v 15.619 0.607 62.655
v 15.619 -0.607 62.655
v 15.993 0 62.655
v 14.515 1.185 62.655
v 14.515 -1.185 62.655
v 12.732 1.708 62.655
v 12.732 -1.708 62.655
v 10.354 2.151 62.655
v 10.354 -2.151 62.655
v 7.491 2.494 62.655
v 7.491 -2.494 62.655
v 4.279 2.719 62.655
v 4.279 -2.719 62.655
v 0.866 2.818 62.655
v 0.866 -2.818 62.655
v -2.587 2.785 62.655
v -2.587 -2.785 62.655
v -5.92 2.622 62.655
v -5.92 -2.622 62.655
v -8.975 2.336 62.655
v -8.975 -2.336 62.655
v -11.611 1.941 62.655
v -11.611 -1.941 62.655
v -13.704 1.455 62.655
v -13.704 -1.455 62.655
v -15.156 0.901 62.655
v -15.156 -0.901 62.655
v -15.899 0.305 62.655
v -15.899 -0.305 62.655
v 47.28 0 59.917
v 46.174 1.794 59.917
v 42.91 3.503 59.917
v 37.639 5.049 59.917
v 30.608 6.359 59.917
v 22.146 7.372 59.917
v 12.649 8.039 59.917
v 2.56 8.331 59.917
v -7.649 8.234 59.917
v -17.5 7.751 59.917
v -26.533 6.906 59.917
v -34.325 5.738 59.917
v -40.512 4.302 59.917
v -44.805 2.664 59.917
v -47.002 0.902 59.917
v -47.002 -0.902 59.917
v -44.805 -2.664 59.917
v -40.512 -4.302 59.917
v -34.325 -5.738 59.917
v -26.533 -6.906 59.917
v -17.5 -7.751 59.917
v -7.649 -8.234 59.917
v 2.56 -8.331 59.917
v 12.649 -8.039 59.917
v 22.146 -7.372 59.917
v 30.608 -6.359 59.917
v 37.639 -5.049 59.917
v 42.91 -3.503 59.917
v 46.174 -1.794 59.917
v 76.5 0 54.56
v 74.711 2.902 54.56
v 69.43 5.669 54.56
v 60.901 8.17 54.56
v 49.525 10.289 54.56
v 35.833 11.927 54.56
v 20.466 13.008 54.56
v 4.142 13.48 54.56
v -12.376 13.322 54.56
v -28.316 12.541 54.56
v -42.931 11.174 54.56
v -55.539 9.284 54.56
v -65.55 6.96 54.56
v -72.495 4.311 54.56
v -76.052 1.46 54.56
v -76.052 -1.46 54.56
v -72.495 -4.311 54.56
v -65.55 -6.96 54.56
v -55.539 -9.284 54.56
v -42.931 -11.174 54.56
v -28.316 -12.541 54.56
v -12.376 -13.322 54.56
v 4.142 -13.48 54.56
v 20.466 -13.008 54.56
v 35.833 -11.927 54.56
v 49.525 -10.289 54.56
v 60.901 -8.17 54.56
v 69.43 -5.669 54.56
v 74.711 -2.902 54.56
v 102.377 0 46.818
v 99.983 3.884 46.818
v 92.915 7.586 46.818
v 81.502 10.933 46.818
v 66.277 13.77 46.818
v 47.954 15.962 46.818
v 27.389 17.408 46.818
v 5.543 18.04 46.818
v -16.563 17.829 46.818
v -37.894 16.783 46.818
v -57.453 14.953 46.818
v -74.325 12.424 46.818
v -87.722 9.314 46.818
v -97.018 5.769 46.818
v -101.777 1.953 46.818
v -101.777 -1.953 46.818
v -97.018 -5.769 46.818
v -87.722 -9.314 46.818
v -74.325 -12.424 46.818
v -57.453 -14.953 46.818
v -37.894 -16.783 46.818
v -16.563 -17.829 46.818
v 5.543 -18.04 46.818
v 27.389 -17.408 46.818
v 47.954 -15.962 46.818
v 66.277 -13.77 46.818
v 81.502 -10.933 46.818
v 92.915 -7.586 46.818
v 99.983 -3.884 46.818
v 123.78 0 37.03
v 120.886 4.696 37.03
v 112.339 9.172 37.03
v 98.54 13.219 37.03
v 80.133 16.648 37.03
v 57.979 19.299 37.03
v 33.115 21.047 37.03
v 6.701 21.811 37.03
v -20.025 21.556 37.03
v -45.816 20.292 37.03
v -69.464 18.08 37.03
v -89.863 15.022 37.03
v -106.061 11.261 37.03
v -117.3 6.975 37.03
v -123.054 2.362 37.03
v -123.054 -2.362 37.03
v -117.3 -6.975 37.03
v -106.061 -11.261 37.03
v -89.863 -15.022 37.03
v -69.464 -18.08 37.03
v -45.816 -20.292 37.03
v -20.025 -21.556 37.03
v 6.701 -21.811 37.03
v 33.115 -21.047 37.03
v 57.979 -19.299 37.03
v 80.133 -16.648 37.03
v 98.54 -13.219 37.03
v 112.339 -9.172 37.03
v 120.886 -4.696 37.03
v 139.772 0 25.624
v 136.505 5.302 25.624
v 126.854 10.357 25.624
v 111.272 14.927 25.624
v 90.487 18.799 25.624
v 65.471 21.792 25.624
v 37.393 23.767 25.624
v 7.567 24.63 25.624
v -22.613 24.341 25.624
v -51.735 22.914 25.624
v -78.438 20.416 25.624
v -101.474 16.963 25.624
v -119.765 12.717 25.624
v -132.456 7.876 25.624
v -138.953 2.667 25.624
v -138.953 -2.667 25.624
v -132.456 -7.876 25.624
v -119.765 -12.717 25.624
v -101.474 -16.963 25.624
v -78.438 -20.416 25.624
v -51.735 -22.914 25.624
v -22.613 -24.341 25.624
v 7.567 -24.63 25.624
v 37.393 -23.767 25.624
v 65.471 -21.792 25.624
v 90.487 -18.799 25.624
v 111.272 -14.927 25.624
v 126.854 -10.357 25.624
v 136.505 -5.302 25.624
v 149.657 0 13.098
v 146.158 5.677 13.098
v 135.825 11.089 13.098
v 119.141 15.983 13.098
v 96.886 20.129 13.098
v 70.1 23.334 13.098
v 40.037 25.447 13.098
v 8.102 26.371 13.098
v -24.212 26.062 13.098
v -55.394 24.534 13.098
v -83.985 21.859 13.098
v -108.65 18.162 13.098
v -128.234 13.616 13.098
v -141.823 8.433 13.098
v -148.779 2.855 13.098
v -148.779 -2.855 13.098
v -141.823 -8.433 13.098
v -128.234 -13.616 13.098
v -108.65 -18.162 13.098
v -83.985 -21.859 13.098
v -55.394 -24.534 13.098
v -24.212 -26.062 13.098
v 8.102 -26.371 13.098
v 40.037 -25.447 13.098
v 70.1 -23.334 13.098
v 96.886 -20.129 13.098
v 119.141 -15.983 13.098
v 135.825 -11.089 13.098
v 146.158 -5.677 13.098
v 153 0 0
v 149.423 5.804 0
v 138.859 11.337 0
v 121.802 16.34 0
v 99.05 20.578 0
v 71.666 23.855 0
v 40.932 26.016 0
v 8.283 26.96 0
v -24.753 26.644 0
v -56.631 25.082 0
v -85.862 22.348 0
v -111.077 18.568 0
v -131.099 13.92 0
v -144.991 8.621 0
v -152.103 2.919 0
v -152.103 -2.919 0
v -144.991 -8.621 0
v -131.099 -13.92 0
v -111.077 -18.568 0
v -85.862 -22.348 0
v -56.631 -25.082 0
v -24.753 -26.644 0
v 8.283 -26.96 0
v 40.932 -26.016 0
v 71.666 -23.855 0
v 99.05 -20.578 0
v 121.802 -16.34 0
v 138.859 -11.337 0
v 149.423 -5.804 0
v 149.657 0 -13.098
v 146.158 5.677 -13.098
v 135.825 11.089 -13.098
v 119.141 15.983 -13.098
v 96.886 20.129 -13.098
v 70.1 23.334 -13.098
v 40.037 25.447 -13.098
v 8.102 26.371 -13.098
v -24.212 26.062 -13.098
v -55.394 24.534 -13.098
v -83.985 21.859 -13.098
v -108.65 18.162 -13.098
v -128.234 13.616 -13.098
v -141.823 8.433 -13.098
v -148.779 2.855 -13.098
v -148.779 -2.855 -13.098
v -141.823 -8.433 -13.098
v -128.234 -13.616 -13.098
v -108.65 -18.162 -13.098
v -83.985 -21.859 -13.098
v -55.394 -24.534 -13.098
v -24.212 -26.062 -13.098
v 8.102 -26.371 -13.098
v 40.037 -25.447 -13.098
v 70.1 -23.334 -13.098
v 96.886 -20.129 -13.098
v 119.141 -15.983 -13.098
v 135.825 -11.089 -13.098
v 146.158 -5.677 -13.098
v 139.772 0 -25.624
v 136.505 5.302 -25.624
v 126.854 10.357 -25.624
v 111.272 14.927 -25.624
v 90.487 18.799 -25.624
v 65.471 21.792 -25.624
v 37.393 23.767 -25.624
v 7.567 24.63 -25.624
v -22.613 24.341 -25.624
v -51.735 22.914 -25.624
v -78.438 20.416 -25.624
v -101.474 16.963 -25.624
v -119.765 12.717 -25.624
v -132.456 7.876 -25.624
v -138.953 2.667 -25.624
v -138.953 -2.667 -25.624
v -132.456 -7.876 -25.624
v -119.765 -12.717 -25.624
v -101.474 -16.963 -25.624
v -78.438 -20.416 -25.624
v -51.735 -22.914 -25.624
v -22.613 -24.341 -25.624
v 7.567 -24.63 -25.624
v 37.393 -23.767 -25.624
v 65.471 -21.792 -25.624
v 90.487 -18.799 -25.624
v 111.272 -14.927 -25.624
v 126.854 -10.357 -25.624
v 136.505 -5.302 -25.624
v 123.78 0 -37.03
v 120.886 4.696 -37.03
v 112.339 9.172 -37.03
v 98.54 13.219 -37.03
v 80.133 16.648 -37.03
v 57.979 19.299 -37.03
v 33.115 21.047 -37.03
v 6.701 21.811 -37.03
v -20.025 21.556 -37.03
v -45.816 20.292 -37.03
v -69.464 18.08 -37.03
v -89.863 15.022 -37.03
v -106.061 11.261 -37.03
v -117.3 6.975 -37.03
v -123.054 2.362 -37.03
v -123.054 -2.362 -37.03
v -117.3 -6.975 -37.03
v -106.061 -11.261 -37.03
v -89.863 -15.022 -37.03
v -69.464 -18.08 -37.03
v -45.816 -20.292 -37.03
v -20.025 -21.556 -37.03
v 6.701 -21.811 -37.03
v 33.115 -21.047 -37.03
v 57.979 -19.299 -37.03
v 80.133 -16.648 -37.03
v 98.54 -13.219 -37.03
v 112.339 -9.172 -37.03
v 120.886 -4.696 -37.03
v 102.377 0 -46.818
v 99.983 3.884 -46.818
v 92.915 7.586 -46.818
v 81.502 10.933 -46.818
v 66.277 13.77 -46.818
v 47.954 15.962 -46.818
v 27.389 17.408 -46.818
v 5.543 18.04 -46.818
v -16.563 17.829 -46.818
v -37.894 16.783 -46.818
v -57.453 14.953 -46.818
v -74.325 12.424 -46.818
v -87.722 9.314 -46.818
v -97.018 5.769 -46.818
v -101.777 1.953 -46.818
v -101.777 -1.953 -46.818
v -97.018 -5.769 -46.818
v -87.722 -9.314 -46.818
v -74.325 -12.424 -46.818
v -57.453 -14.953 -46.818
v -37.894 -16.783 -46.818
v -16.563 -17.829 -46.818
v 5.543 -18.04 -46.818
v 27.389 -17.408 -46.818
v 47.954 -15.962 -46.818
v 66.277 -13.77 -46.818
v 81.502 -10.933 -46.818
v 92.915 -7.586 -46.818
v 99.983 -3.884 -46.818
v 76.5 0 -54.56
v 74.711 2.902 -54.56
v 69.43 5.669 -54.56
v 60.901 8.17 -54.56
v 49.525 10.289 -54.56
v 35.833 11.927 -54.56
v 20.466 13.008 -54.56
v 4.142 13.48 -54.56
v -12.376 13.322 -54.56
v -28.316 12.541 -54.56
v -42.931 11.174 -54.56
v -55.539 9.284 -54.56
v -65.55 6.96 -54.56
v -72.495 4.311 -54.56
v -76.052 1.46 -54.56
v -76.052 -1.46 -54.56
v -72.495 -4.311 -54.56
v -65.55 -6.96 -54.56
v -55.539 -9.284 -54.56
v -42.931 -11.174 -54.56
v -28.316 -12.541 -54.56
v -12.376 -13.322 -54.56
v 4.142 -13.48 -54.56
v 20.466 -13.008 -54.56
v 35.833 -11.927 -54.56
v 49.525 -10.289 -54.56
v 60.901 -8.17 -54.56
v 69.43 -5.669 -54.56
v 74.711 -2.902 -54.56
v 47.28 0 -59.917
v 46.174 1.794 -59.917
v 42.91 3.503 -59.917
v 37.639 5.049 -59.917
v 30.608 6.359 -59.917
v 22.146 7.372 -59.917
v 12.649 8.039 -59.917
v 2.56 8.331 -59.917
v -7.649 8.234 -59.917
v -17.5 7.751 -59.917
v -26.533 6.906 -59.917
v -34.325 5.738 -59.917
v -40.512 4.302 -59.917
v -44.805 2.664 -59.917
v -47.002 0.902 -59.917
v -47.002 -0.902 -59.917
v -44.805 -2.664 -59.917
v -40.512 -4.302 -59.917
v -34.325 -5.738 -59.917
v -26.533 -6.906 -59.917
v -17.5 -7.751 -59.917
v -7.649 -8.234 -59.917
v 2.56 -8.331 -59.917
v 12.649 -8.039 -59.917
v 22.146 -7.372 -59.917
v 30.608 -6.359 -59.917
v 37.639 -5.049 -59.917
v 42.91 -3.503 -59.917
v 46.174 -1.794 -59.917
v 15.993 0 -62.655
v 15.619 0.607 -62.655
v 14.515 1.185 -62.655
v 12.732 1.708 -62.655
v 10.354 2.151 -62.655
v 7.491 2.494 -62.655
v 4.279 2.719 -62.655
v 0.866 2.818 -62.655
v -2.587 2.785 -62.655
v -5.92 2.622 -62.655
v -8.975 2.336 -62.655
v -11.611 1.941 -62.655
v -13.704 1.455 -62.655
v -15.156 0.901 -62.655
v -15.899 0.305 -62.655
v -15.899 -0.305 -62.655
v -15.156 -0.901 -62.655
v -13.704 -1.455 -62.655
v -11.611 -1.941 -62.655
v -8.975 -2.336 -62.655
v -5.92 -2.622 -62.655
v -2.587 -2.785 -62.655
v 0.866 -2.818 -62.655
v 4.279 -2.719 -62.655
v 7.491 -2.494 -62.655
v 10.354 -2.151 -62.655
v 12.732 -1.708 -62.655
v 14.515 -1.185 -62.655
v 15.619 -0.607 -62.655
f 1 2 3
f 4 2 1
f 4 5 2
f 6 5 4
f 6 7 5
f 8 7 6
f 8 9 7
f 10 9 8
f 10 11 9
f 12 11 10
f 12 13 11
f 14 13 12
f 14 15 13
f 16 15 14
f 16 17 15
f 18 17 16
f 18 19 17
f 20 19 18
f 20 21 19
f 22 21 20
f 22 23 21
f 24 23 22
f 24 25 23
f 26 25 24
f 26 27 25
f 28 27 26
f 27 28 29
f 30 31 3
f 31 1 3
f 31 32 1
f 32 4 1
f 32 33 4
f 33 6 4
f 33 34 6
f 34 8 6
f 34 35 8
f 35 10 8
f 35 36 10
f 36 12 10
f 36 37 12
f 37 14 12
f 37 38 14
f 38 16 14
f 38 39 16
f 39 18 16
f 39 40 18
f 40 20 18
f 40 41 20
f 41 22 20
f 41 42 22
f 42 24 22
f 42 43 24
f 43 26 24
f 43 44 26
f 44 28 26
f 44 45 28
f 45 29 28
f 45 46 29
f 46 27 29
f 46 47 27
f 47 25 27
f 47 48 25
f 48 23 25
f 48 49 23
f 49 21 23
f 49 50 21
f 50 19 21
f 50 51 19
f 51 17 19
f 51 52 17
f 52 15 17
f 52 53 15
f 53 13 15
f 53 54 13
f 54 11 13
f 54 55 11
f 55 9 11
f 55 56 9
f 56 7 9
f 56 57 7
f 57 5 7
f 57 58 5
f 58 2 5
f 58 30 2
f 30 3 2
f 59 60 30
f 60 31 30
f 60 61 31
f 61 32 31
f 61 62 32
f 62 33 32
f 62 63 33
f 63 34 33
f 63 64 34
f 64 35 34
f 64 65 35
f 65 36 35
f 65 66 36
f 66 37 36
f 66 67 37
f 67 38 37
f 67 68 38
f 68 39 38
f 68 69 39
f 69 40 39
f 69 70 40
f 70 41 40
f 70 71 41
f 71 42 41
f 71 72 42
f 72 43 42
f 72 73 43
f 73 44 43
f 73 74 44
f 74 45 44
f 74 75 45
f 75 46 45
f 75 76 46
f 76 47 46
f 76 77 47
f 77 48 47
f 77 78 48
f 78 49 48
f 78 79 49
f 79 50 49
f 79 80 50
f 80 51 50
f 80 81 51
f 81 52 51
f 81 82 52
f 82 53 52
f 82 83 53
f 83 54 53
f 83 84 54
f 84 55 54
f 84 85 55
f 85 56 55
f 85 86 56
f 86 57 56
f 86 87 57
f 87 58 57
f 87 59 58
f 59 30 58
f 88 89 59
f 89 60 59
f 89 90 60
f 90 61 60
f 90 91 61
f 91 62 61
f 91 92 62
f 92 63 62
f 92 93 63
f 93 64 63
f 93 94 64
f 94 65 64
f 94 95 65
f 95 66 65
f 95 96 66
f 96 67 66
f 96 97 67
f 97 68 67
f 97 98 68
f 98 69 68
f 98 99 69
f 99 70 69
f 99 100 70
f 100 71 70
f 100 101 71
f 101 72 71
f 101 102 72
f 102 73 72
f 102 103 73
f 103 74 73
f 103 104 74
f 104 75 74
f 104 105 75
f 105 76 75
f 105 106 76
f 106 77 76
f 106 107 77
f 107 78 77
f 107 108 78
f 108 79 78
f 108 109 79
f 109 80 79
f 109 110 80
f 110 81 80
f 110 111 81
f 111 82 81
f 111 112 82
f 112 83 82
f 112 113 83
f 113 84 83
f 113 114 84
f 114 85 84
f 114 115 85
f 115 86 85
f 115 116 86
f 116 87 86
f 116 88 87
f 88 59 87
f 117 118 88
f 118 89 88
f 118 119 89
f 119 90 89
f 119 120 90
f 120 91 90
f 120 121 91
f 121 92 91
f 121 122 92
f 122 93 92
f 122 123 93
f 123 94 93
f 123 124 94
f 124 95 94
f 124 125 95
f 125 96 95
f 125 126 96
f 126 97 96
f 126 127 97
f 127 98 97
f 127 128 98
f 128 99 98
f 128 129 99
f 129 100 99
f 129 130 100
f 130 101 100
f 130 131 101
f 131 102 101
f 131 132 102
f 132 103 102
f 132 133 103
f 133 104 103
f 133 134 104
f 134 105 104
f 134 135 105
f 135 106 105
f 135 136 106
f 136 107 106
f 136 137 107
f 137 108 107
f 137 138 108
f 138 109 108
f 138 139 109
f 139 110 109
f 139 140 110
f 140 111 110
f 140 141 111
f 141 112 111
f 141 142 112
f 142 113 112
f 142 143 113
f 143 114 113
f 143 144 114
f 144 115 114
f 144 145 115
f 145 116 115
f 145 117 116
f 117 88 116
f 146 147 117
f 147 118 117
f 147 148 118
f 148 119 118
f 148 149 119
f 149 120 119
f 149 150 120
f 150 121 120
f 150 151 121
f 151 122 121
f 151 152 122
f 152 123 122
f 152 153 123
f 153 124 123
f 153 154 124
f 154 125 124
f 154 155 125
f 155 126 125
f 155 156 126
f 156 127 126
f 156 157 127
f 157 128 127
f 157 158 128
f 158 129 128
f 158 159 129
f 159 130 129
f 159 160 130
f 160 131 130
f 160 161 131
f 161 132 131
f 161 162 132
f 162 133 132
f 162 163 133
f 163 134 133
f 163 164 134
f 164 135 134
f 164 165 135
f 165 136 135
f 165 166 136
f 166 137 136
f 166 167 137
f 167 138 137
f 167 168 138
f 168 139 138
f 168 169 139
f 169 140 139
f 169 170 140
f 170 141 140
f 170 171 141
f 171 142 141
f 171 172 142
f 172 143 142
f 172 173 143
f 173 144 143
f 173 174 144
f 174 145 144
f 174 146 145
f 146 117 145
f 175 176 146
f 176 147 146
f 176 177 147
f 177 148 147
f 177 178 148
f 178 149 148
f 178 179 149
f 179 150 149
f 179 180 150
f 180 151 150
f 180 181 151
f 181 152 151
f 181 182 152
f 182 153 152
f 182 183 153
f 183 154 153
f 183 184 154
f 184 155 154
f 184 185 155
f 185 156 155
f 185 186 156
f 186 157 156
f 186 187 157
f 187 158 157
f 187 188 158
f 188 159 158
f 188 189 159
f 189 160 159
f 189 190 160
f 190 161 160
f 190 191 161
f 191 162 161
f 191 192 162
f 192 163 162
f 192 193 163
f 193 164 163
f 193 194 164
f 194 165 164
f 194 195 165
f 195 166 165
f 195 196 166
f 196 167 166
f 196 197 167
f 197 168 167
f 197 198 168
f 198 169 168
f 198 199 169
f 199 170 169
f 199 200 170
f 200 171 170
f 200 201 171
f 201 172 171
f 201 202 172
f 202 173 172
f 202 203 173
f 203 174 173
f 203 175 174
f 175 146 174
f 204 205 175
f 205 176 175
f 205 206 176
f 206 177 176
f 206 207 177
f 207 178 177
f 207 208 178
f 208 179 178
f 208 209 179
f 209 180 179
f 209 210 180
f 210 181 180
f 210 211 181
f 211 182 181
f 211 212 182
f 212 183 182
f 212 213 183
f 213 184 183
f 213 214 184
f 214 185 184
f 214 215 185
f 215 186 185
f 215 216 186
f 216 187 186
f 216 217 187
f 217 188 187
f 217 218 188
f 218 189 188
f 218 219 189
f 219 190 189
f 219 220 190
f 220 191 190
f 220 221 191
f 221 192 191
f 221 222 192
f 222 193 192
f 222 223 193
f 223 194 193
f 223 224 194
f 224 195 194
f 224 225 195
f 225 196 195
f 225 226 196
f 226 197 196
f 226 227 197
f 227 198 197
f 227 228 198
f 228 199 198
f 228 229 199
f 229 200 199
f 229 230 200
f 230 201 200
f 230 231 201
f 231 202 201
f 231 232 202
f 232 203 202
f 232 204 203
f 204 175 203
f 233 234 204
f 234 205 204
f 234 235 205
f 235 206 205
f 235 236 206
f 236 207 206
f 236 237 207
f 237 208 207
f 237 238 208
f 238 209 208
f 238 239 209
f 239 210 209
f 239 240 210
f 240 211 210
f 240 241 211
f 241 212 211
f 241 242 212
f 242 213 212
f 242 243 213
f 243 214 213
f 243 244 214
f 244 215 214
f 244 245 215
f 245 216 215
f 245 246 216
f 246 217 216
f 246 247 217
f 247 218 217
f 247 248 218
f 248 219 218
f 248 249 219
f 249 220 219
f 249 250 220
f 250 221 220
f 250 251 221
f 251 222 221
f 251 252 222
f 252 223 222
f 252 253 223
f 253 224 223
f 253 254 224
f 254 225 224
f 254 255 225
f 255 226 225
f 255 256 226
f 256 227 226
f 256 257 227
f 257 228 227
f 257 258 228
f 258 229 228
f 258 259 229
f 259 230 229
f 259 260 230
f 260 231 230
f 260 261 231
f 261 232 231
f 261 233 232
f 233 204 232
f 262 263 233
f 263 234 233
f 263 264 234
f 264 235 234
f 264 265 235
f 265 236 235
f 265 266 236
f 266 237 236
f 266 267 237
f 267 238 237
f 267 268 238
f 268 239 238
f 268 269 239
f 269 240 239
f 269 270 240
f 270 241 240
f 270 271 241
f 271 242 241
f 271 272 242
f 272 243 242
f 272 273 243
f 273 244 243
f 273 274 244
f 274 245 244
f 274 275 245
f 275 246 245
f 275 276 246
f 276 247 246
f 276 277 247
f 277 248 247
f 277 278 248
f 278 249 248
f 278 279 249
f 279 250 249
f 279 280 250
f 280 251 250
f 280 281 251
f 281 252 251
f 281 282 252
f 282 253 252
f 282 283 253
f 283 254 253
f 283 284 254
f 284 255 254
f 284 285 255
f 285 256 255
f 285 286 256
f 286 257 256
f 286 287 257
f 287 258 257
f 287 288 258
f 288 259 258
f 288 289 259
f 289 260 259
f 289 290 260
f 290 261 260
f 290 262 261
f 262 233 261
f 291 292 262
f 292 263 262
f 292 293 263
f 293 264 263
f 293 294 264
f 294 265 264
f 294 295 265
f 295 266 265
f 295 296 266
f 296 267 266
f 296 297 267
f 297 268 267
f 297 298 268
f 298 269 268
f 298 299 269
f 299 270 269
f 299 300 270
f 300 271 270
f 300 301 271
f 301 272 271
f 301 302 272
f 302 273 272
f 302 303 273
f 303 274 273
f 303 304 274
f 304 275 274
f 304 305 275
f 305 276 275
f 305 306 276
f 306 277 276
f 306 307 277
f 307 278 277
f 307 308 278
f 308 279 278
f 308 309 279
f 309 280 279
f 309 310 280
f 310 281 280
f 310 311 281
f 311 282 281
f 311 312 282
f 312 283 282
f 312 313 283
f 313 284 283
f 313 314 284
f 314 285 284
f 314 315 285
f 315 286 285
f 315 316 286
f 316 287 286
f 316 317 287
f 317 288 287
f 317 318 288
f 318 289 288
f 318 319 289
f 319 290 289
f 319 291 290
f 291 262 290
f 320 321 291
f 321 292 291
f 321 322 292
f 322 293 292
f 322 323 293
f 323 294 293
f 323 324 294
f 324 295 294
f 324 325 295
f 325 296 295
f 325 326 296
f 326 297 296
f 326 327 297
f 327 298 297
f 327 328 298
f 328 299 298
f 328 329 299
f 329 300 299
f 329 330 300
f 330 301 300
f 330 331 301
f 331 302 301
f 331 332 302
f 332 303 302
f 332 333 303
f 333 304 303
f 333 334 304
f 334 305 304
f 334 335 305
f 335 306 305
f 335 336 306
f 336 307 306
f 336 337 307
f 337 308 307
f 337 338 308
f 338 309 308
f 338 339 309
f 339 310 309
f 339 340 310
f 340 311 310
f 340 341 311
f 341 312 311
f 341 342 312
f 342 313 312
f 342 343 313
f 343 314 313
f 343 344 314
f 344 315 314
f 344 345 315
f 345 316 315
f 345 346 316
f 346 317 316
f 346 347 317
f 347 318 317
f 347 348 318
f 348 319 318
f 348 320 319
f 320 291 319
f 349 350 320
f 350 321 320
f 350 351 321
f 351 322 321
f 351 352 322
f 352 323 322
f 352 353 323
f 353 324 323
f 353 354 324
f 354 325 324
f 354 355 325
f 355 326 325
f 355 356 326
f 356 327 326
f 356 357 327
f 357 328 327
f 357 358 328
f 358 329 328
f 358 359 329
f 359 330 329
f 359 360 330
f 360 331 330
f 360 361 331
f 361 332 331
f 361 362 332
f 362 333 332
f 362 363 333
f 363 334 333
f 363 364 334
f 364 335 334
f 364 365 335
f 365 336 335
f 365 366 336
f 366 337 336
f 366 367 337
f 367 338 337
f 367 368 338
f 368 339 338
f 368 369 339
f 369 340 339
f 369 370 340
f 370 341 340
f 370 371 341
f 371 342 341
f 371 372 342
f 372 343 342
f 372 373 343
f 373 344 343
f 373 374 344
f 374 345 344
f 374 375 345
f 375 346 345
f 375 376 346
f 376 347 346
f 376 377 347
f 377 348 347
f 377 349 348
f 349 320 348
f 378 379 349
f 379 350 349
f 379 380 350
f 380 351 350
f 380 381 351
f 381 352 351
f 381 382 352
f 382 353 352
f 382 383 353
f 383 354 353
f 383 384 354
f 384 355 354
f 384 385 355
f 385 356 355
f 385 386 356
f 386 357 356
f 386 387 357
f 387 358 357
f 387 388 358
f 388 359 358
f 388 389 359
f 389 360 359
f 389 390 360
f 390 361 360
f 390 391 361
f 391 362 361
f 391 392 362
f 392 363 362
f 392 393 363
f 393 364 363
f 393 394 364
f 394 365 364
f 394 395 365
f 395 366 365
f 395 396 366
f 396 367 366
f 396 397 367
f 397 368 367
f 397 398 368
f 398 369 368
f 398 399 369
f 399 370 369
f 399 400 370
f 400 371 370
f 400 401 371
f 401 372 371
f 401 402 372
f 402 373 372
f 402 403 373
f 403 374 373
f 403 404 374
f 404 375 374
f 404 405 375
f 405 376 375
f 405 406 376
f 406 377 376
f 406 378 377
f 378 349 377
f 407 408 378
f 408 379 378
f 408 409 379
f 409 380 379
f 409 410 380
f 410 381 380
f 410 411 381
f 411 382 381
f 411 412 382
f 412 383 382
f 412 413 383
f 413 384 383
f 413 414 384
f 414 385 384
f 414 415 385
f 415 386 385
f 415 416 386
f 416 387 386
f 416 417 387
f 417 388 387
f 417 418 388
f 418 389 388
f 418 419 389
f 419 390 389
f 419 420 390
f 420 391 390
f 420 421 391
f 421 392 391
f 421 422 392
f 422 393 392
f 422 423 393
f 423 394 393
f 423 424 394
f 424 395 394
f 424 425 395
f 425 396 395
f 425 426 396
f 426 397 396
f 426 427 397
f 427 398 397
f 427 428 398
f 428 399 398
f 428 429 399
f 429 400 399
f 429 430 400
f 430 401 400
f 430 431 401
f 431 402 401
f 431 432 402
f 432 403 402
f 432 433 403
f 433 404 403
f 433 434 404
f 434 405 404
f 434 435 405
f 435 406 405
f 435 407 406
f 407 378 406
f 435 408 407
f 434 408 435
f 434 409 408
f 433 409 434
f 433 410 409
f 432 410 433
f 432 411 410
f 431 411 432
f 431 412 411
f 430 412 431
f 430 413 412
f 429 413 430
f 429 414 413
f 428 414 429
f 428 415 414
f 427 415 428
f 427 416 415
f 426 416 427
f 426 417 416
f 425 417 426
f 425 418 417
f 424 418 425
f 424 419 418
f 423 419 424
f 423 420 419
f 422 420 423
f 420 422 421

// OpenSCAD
// Generated by SolidPython 1.0.1 on 2020-07-29 00:46:52


scale(v = [17, 3, 7]) {
	sphere(r = 9);
}
/***********************************************
*********      SolidPython code:      **********
************************************************
 
# import packages: SolidPython
from solid import *
from solid.utils import *
from itertools import chain, combinations, permutations


class Resize:

    def __init__(self, scad_file):
        self.scad_file = scad_file
        #self.scad_file = import_scad(scad_file)
        # cone/cylinder param:
        self.r1 = 0
        self.r2 = 0
        self.h = 0
        # rectangular prism param:
        self.w = 0
        self.l = 0
        # ellipse param:
        self.r = 0

    # import OpenScad code (file name corresponds to shape)


    # classify shape + parameters
    def assign(self, param1, param2, param3):
        if self.scad_file == 'cone.scad':
            self.r1 = param1
            self.r2 = param2
            self.h = param3
        elif self.scad_file == 'cylinder.scad':
            self.r1 = param1
            self.r2 = param2
            self.h = param3
        elif self.scad_file == 'rectangularPrism.scad':
            self.h = param1
            self.l = param2
            self.w = param3
        else:
            self.r = param1
            self.h = param2

    # resize parameters
    def iterate(self):
        x = range(3, 20, 2)
        i = 1
        if self.scad_file == 'cone.scad':
            tempList = list(permutations(x, 2))
            for temp in tempList:
                param1 = temp[0]
                param2 = temp[1]
                filepath = 'produced_scad_files/' + 'cone' + str(param1) + '_' + str(param2) + '_' + '.scad'
                scad_render_to_file(cylinder(h=param1, r1=param2, r2=0), filepath)

        elif self.scad_file == 'cylinder.scad':
            tempList = list(permutations(x, 3))
            for temp in tempList:
                param1 = temp[0]
                param2 = temp[1]
                filepath = 'produced_scad_files/' + 'cylinder' + str(param1) + '_' + str(param2) + '_' + '.scad'
                scad_render_to_file(cylinder(h=param1, r1=param2, r2=param2), filepath)

        elif self.scad_file == 'rectangularPrism.scad':
            tempList = list(permutations(x, 3))
            for temp in tempList:
                param1 = temp[0]
                param2 = temp[1]
                param3 = temp[2]
                filepath = 'produced_scad_files/' + 'rectangularPrism' + str(param1) + '_' + str(param2) + '_' + str(
                    param3) + '.scad'
                scad_render_to_file(cube(size=(param1, param2, param3)), filepath)

        elif self.scad_file == 'ellipse.scad':
            tempList = list(permutations(x, 4))
            for temp in tempList:
                param1 = temp[0]
                param2 = temp[1]
                param3 = temp[2]
                param4 = temp[3]
                filepath = 'produced_scad_files/' + 'ellipse' + str(param1) + '_' + str(param2) + '_' + str(param3) + '_' + str(param4) + '.scad'
                scad_render_to_file(scale([param1, param2, param3])(sphere(r=param4)), filepath)

    def render_to_scadfile(self):
        scad_render_to_file(scad, 'example.scad') 
 
************************************************/
